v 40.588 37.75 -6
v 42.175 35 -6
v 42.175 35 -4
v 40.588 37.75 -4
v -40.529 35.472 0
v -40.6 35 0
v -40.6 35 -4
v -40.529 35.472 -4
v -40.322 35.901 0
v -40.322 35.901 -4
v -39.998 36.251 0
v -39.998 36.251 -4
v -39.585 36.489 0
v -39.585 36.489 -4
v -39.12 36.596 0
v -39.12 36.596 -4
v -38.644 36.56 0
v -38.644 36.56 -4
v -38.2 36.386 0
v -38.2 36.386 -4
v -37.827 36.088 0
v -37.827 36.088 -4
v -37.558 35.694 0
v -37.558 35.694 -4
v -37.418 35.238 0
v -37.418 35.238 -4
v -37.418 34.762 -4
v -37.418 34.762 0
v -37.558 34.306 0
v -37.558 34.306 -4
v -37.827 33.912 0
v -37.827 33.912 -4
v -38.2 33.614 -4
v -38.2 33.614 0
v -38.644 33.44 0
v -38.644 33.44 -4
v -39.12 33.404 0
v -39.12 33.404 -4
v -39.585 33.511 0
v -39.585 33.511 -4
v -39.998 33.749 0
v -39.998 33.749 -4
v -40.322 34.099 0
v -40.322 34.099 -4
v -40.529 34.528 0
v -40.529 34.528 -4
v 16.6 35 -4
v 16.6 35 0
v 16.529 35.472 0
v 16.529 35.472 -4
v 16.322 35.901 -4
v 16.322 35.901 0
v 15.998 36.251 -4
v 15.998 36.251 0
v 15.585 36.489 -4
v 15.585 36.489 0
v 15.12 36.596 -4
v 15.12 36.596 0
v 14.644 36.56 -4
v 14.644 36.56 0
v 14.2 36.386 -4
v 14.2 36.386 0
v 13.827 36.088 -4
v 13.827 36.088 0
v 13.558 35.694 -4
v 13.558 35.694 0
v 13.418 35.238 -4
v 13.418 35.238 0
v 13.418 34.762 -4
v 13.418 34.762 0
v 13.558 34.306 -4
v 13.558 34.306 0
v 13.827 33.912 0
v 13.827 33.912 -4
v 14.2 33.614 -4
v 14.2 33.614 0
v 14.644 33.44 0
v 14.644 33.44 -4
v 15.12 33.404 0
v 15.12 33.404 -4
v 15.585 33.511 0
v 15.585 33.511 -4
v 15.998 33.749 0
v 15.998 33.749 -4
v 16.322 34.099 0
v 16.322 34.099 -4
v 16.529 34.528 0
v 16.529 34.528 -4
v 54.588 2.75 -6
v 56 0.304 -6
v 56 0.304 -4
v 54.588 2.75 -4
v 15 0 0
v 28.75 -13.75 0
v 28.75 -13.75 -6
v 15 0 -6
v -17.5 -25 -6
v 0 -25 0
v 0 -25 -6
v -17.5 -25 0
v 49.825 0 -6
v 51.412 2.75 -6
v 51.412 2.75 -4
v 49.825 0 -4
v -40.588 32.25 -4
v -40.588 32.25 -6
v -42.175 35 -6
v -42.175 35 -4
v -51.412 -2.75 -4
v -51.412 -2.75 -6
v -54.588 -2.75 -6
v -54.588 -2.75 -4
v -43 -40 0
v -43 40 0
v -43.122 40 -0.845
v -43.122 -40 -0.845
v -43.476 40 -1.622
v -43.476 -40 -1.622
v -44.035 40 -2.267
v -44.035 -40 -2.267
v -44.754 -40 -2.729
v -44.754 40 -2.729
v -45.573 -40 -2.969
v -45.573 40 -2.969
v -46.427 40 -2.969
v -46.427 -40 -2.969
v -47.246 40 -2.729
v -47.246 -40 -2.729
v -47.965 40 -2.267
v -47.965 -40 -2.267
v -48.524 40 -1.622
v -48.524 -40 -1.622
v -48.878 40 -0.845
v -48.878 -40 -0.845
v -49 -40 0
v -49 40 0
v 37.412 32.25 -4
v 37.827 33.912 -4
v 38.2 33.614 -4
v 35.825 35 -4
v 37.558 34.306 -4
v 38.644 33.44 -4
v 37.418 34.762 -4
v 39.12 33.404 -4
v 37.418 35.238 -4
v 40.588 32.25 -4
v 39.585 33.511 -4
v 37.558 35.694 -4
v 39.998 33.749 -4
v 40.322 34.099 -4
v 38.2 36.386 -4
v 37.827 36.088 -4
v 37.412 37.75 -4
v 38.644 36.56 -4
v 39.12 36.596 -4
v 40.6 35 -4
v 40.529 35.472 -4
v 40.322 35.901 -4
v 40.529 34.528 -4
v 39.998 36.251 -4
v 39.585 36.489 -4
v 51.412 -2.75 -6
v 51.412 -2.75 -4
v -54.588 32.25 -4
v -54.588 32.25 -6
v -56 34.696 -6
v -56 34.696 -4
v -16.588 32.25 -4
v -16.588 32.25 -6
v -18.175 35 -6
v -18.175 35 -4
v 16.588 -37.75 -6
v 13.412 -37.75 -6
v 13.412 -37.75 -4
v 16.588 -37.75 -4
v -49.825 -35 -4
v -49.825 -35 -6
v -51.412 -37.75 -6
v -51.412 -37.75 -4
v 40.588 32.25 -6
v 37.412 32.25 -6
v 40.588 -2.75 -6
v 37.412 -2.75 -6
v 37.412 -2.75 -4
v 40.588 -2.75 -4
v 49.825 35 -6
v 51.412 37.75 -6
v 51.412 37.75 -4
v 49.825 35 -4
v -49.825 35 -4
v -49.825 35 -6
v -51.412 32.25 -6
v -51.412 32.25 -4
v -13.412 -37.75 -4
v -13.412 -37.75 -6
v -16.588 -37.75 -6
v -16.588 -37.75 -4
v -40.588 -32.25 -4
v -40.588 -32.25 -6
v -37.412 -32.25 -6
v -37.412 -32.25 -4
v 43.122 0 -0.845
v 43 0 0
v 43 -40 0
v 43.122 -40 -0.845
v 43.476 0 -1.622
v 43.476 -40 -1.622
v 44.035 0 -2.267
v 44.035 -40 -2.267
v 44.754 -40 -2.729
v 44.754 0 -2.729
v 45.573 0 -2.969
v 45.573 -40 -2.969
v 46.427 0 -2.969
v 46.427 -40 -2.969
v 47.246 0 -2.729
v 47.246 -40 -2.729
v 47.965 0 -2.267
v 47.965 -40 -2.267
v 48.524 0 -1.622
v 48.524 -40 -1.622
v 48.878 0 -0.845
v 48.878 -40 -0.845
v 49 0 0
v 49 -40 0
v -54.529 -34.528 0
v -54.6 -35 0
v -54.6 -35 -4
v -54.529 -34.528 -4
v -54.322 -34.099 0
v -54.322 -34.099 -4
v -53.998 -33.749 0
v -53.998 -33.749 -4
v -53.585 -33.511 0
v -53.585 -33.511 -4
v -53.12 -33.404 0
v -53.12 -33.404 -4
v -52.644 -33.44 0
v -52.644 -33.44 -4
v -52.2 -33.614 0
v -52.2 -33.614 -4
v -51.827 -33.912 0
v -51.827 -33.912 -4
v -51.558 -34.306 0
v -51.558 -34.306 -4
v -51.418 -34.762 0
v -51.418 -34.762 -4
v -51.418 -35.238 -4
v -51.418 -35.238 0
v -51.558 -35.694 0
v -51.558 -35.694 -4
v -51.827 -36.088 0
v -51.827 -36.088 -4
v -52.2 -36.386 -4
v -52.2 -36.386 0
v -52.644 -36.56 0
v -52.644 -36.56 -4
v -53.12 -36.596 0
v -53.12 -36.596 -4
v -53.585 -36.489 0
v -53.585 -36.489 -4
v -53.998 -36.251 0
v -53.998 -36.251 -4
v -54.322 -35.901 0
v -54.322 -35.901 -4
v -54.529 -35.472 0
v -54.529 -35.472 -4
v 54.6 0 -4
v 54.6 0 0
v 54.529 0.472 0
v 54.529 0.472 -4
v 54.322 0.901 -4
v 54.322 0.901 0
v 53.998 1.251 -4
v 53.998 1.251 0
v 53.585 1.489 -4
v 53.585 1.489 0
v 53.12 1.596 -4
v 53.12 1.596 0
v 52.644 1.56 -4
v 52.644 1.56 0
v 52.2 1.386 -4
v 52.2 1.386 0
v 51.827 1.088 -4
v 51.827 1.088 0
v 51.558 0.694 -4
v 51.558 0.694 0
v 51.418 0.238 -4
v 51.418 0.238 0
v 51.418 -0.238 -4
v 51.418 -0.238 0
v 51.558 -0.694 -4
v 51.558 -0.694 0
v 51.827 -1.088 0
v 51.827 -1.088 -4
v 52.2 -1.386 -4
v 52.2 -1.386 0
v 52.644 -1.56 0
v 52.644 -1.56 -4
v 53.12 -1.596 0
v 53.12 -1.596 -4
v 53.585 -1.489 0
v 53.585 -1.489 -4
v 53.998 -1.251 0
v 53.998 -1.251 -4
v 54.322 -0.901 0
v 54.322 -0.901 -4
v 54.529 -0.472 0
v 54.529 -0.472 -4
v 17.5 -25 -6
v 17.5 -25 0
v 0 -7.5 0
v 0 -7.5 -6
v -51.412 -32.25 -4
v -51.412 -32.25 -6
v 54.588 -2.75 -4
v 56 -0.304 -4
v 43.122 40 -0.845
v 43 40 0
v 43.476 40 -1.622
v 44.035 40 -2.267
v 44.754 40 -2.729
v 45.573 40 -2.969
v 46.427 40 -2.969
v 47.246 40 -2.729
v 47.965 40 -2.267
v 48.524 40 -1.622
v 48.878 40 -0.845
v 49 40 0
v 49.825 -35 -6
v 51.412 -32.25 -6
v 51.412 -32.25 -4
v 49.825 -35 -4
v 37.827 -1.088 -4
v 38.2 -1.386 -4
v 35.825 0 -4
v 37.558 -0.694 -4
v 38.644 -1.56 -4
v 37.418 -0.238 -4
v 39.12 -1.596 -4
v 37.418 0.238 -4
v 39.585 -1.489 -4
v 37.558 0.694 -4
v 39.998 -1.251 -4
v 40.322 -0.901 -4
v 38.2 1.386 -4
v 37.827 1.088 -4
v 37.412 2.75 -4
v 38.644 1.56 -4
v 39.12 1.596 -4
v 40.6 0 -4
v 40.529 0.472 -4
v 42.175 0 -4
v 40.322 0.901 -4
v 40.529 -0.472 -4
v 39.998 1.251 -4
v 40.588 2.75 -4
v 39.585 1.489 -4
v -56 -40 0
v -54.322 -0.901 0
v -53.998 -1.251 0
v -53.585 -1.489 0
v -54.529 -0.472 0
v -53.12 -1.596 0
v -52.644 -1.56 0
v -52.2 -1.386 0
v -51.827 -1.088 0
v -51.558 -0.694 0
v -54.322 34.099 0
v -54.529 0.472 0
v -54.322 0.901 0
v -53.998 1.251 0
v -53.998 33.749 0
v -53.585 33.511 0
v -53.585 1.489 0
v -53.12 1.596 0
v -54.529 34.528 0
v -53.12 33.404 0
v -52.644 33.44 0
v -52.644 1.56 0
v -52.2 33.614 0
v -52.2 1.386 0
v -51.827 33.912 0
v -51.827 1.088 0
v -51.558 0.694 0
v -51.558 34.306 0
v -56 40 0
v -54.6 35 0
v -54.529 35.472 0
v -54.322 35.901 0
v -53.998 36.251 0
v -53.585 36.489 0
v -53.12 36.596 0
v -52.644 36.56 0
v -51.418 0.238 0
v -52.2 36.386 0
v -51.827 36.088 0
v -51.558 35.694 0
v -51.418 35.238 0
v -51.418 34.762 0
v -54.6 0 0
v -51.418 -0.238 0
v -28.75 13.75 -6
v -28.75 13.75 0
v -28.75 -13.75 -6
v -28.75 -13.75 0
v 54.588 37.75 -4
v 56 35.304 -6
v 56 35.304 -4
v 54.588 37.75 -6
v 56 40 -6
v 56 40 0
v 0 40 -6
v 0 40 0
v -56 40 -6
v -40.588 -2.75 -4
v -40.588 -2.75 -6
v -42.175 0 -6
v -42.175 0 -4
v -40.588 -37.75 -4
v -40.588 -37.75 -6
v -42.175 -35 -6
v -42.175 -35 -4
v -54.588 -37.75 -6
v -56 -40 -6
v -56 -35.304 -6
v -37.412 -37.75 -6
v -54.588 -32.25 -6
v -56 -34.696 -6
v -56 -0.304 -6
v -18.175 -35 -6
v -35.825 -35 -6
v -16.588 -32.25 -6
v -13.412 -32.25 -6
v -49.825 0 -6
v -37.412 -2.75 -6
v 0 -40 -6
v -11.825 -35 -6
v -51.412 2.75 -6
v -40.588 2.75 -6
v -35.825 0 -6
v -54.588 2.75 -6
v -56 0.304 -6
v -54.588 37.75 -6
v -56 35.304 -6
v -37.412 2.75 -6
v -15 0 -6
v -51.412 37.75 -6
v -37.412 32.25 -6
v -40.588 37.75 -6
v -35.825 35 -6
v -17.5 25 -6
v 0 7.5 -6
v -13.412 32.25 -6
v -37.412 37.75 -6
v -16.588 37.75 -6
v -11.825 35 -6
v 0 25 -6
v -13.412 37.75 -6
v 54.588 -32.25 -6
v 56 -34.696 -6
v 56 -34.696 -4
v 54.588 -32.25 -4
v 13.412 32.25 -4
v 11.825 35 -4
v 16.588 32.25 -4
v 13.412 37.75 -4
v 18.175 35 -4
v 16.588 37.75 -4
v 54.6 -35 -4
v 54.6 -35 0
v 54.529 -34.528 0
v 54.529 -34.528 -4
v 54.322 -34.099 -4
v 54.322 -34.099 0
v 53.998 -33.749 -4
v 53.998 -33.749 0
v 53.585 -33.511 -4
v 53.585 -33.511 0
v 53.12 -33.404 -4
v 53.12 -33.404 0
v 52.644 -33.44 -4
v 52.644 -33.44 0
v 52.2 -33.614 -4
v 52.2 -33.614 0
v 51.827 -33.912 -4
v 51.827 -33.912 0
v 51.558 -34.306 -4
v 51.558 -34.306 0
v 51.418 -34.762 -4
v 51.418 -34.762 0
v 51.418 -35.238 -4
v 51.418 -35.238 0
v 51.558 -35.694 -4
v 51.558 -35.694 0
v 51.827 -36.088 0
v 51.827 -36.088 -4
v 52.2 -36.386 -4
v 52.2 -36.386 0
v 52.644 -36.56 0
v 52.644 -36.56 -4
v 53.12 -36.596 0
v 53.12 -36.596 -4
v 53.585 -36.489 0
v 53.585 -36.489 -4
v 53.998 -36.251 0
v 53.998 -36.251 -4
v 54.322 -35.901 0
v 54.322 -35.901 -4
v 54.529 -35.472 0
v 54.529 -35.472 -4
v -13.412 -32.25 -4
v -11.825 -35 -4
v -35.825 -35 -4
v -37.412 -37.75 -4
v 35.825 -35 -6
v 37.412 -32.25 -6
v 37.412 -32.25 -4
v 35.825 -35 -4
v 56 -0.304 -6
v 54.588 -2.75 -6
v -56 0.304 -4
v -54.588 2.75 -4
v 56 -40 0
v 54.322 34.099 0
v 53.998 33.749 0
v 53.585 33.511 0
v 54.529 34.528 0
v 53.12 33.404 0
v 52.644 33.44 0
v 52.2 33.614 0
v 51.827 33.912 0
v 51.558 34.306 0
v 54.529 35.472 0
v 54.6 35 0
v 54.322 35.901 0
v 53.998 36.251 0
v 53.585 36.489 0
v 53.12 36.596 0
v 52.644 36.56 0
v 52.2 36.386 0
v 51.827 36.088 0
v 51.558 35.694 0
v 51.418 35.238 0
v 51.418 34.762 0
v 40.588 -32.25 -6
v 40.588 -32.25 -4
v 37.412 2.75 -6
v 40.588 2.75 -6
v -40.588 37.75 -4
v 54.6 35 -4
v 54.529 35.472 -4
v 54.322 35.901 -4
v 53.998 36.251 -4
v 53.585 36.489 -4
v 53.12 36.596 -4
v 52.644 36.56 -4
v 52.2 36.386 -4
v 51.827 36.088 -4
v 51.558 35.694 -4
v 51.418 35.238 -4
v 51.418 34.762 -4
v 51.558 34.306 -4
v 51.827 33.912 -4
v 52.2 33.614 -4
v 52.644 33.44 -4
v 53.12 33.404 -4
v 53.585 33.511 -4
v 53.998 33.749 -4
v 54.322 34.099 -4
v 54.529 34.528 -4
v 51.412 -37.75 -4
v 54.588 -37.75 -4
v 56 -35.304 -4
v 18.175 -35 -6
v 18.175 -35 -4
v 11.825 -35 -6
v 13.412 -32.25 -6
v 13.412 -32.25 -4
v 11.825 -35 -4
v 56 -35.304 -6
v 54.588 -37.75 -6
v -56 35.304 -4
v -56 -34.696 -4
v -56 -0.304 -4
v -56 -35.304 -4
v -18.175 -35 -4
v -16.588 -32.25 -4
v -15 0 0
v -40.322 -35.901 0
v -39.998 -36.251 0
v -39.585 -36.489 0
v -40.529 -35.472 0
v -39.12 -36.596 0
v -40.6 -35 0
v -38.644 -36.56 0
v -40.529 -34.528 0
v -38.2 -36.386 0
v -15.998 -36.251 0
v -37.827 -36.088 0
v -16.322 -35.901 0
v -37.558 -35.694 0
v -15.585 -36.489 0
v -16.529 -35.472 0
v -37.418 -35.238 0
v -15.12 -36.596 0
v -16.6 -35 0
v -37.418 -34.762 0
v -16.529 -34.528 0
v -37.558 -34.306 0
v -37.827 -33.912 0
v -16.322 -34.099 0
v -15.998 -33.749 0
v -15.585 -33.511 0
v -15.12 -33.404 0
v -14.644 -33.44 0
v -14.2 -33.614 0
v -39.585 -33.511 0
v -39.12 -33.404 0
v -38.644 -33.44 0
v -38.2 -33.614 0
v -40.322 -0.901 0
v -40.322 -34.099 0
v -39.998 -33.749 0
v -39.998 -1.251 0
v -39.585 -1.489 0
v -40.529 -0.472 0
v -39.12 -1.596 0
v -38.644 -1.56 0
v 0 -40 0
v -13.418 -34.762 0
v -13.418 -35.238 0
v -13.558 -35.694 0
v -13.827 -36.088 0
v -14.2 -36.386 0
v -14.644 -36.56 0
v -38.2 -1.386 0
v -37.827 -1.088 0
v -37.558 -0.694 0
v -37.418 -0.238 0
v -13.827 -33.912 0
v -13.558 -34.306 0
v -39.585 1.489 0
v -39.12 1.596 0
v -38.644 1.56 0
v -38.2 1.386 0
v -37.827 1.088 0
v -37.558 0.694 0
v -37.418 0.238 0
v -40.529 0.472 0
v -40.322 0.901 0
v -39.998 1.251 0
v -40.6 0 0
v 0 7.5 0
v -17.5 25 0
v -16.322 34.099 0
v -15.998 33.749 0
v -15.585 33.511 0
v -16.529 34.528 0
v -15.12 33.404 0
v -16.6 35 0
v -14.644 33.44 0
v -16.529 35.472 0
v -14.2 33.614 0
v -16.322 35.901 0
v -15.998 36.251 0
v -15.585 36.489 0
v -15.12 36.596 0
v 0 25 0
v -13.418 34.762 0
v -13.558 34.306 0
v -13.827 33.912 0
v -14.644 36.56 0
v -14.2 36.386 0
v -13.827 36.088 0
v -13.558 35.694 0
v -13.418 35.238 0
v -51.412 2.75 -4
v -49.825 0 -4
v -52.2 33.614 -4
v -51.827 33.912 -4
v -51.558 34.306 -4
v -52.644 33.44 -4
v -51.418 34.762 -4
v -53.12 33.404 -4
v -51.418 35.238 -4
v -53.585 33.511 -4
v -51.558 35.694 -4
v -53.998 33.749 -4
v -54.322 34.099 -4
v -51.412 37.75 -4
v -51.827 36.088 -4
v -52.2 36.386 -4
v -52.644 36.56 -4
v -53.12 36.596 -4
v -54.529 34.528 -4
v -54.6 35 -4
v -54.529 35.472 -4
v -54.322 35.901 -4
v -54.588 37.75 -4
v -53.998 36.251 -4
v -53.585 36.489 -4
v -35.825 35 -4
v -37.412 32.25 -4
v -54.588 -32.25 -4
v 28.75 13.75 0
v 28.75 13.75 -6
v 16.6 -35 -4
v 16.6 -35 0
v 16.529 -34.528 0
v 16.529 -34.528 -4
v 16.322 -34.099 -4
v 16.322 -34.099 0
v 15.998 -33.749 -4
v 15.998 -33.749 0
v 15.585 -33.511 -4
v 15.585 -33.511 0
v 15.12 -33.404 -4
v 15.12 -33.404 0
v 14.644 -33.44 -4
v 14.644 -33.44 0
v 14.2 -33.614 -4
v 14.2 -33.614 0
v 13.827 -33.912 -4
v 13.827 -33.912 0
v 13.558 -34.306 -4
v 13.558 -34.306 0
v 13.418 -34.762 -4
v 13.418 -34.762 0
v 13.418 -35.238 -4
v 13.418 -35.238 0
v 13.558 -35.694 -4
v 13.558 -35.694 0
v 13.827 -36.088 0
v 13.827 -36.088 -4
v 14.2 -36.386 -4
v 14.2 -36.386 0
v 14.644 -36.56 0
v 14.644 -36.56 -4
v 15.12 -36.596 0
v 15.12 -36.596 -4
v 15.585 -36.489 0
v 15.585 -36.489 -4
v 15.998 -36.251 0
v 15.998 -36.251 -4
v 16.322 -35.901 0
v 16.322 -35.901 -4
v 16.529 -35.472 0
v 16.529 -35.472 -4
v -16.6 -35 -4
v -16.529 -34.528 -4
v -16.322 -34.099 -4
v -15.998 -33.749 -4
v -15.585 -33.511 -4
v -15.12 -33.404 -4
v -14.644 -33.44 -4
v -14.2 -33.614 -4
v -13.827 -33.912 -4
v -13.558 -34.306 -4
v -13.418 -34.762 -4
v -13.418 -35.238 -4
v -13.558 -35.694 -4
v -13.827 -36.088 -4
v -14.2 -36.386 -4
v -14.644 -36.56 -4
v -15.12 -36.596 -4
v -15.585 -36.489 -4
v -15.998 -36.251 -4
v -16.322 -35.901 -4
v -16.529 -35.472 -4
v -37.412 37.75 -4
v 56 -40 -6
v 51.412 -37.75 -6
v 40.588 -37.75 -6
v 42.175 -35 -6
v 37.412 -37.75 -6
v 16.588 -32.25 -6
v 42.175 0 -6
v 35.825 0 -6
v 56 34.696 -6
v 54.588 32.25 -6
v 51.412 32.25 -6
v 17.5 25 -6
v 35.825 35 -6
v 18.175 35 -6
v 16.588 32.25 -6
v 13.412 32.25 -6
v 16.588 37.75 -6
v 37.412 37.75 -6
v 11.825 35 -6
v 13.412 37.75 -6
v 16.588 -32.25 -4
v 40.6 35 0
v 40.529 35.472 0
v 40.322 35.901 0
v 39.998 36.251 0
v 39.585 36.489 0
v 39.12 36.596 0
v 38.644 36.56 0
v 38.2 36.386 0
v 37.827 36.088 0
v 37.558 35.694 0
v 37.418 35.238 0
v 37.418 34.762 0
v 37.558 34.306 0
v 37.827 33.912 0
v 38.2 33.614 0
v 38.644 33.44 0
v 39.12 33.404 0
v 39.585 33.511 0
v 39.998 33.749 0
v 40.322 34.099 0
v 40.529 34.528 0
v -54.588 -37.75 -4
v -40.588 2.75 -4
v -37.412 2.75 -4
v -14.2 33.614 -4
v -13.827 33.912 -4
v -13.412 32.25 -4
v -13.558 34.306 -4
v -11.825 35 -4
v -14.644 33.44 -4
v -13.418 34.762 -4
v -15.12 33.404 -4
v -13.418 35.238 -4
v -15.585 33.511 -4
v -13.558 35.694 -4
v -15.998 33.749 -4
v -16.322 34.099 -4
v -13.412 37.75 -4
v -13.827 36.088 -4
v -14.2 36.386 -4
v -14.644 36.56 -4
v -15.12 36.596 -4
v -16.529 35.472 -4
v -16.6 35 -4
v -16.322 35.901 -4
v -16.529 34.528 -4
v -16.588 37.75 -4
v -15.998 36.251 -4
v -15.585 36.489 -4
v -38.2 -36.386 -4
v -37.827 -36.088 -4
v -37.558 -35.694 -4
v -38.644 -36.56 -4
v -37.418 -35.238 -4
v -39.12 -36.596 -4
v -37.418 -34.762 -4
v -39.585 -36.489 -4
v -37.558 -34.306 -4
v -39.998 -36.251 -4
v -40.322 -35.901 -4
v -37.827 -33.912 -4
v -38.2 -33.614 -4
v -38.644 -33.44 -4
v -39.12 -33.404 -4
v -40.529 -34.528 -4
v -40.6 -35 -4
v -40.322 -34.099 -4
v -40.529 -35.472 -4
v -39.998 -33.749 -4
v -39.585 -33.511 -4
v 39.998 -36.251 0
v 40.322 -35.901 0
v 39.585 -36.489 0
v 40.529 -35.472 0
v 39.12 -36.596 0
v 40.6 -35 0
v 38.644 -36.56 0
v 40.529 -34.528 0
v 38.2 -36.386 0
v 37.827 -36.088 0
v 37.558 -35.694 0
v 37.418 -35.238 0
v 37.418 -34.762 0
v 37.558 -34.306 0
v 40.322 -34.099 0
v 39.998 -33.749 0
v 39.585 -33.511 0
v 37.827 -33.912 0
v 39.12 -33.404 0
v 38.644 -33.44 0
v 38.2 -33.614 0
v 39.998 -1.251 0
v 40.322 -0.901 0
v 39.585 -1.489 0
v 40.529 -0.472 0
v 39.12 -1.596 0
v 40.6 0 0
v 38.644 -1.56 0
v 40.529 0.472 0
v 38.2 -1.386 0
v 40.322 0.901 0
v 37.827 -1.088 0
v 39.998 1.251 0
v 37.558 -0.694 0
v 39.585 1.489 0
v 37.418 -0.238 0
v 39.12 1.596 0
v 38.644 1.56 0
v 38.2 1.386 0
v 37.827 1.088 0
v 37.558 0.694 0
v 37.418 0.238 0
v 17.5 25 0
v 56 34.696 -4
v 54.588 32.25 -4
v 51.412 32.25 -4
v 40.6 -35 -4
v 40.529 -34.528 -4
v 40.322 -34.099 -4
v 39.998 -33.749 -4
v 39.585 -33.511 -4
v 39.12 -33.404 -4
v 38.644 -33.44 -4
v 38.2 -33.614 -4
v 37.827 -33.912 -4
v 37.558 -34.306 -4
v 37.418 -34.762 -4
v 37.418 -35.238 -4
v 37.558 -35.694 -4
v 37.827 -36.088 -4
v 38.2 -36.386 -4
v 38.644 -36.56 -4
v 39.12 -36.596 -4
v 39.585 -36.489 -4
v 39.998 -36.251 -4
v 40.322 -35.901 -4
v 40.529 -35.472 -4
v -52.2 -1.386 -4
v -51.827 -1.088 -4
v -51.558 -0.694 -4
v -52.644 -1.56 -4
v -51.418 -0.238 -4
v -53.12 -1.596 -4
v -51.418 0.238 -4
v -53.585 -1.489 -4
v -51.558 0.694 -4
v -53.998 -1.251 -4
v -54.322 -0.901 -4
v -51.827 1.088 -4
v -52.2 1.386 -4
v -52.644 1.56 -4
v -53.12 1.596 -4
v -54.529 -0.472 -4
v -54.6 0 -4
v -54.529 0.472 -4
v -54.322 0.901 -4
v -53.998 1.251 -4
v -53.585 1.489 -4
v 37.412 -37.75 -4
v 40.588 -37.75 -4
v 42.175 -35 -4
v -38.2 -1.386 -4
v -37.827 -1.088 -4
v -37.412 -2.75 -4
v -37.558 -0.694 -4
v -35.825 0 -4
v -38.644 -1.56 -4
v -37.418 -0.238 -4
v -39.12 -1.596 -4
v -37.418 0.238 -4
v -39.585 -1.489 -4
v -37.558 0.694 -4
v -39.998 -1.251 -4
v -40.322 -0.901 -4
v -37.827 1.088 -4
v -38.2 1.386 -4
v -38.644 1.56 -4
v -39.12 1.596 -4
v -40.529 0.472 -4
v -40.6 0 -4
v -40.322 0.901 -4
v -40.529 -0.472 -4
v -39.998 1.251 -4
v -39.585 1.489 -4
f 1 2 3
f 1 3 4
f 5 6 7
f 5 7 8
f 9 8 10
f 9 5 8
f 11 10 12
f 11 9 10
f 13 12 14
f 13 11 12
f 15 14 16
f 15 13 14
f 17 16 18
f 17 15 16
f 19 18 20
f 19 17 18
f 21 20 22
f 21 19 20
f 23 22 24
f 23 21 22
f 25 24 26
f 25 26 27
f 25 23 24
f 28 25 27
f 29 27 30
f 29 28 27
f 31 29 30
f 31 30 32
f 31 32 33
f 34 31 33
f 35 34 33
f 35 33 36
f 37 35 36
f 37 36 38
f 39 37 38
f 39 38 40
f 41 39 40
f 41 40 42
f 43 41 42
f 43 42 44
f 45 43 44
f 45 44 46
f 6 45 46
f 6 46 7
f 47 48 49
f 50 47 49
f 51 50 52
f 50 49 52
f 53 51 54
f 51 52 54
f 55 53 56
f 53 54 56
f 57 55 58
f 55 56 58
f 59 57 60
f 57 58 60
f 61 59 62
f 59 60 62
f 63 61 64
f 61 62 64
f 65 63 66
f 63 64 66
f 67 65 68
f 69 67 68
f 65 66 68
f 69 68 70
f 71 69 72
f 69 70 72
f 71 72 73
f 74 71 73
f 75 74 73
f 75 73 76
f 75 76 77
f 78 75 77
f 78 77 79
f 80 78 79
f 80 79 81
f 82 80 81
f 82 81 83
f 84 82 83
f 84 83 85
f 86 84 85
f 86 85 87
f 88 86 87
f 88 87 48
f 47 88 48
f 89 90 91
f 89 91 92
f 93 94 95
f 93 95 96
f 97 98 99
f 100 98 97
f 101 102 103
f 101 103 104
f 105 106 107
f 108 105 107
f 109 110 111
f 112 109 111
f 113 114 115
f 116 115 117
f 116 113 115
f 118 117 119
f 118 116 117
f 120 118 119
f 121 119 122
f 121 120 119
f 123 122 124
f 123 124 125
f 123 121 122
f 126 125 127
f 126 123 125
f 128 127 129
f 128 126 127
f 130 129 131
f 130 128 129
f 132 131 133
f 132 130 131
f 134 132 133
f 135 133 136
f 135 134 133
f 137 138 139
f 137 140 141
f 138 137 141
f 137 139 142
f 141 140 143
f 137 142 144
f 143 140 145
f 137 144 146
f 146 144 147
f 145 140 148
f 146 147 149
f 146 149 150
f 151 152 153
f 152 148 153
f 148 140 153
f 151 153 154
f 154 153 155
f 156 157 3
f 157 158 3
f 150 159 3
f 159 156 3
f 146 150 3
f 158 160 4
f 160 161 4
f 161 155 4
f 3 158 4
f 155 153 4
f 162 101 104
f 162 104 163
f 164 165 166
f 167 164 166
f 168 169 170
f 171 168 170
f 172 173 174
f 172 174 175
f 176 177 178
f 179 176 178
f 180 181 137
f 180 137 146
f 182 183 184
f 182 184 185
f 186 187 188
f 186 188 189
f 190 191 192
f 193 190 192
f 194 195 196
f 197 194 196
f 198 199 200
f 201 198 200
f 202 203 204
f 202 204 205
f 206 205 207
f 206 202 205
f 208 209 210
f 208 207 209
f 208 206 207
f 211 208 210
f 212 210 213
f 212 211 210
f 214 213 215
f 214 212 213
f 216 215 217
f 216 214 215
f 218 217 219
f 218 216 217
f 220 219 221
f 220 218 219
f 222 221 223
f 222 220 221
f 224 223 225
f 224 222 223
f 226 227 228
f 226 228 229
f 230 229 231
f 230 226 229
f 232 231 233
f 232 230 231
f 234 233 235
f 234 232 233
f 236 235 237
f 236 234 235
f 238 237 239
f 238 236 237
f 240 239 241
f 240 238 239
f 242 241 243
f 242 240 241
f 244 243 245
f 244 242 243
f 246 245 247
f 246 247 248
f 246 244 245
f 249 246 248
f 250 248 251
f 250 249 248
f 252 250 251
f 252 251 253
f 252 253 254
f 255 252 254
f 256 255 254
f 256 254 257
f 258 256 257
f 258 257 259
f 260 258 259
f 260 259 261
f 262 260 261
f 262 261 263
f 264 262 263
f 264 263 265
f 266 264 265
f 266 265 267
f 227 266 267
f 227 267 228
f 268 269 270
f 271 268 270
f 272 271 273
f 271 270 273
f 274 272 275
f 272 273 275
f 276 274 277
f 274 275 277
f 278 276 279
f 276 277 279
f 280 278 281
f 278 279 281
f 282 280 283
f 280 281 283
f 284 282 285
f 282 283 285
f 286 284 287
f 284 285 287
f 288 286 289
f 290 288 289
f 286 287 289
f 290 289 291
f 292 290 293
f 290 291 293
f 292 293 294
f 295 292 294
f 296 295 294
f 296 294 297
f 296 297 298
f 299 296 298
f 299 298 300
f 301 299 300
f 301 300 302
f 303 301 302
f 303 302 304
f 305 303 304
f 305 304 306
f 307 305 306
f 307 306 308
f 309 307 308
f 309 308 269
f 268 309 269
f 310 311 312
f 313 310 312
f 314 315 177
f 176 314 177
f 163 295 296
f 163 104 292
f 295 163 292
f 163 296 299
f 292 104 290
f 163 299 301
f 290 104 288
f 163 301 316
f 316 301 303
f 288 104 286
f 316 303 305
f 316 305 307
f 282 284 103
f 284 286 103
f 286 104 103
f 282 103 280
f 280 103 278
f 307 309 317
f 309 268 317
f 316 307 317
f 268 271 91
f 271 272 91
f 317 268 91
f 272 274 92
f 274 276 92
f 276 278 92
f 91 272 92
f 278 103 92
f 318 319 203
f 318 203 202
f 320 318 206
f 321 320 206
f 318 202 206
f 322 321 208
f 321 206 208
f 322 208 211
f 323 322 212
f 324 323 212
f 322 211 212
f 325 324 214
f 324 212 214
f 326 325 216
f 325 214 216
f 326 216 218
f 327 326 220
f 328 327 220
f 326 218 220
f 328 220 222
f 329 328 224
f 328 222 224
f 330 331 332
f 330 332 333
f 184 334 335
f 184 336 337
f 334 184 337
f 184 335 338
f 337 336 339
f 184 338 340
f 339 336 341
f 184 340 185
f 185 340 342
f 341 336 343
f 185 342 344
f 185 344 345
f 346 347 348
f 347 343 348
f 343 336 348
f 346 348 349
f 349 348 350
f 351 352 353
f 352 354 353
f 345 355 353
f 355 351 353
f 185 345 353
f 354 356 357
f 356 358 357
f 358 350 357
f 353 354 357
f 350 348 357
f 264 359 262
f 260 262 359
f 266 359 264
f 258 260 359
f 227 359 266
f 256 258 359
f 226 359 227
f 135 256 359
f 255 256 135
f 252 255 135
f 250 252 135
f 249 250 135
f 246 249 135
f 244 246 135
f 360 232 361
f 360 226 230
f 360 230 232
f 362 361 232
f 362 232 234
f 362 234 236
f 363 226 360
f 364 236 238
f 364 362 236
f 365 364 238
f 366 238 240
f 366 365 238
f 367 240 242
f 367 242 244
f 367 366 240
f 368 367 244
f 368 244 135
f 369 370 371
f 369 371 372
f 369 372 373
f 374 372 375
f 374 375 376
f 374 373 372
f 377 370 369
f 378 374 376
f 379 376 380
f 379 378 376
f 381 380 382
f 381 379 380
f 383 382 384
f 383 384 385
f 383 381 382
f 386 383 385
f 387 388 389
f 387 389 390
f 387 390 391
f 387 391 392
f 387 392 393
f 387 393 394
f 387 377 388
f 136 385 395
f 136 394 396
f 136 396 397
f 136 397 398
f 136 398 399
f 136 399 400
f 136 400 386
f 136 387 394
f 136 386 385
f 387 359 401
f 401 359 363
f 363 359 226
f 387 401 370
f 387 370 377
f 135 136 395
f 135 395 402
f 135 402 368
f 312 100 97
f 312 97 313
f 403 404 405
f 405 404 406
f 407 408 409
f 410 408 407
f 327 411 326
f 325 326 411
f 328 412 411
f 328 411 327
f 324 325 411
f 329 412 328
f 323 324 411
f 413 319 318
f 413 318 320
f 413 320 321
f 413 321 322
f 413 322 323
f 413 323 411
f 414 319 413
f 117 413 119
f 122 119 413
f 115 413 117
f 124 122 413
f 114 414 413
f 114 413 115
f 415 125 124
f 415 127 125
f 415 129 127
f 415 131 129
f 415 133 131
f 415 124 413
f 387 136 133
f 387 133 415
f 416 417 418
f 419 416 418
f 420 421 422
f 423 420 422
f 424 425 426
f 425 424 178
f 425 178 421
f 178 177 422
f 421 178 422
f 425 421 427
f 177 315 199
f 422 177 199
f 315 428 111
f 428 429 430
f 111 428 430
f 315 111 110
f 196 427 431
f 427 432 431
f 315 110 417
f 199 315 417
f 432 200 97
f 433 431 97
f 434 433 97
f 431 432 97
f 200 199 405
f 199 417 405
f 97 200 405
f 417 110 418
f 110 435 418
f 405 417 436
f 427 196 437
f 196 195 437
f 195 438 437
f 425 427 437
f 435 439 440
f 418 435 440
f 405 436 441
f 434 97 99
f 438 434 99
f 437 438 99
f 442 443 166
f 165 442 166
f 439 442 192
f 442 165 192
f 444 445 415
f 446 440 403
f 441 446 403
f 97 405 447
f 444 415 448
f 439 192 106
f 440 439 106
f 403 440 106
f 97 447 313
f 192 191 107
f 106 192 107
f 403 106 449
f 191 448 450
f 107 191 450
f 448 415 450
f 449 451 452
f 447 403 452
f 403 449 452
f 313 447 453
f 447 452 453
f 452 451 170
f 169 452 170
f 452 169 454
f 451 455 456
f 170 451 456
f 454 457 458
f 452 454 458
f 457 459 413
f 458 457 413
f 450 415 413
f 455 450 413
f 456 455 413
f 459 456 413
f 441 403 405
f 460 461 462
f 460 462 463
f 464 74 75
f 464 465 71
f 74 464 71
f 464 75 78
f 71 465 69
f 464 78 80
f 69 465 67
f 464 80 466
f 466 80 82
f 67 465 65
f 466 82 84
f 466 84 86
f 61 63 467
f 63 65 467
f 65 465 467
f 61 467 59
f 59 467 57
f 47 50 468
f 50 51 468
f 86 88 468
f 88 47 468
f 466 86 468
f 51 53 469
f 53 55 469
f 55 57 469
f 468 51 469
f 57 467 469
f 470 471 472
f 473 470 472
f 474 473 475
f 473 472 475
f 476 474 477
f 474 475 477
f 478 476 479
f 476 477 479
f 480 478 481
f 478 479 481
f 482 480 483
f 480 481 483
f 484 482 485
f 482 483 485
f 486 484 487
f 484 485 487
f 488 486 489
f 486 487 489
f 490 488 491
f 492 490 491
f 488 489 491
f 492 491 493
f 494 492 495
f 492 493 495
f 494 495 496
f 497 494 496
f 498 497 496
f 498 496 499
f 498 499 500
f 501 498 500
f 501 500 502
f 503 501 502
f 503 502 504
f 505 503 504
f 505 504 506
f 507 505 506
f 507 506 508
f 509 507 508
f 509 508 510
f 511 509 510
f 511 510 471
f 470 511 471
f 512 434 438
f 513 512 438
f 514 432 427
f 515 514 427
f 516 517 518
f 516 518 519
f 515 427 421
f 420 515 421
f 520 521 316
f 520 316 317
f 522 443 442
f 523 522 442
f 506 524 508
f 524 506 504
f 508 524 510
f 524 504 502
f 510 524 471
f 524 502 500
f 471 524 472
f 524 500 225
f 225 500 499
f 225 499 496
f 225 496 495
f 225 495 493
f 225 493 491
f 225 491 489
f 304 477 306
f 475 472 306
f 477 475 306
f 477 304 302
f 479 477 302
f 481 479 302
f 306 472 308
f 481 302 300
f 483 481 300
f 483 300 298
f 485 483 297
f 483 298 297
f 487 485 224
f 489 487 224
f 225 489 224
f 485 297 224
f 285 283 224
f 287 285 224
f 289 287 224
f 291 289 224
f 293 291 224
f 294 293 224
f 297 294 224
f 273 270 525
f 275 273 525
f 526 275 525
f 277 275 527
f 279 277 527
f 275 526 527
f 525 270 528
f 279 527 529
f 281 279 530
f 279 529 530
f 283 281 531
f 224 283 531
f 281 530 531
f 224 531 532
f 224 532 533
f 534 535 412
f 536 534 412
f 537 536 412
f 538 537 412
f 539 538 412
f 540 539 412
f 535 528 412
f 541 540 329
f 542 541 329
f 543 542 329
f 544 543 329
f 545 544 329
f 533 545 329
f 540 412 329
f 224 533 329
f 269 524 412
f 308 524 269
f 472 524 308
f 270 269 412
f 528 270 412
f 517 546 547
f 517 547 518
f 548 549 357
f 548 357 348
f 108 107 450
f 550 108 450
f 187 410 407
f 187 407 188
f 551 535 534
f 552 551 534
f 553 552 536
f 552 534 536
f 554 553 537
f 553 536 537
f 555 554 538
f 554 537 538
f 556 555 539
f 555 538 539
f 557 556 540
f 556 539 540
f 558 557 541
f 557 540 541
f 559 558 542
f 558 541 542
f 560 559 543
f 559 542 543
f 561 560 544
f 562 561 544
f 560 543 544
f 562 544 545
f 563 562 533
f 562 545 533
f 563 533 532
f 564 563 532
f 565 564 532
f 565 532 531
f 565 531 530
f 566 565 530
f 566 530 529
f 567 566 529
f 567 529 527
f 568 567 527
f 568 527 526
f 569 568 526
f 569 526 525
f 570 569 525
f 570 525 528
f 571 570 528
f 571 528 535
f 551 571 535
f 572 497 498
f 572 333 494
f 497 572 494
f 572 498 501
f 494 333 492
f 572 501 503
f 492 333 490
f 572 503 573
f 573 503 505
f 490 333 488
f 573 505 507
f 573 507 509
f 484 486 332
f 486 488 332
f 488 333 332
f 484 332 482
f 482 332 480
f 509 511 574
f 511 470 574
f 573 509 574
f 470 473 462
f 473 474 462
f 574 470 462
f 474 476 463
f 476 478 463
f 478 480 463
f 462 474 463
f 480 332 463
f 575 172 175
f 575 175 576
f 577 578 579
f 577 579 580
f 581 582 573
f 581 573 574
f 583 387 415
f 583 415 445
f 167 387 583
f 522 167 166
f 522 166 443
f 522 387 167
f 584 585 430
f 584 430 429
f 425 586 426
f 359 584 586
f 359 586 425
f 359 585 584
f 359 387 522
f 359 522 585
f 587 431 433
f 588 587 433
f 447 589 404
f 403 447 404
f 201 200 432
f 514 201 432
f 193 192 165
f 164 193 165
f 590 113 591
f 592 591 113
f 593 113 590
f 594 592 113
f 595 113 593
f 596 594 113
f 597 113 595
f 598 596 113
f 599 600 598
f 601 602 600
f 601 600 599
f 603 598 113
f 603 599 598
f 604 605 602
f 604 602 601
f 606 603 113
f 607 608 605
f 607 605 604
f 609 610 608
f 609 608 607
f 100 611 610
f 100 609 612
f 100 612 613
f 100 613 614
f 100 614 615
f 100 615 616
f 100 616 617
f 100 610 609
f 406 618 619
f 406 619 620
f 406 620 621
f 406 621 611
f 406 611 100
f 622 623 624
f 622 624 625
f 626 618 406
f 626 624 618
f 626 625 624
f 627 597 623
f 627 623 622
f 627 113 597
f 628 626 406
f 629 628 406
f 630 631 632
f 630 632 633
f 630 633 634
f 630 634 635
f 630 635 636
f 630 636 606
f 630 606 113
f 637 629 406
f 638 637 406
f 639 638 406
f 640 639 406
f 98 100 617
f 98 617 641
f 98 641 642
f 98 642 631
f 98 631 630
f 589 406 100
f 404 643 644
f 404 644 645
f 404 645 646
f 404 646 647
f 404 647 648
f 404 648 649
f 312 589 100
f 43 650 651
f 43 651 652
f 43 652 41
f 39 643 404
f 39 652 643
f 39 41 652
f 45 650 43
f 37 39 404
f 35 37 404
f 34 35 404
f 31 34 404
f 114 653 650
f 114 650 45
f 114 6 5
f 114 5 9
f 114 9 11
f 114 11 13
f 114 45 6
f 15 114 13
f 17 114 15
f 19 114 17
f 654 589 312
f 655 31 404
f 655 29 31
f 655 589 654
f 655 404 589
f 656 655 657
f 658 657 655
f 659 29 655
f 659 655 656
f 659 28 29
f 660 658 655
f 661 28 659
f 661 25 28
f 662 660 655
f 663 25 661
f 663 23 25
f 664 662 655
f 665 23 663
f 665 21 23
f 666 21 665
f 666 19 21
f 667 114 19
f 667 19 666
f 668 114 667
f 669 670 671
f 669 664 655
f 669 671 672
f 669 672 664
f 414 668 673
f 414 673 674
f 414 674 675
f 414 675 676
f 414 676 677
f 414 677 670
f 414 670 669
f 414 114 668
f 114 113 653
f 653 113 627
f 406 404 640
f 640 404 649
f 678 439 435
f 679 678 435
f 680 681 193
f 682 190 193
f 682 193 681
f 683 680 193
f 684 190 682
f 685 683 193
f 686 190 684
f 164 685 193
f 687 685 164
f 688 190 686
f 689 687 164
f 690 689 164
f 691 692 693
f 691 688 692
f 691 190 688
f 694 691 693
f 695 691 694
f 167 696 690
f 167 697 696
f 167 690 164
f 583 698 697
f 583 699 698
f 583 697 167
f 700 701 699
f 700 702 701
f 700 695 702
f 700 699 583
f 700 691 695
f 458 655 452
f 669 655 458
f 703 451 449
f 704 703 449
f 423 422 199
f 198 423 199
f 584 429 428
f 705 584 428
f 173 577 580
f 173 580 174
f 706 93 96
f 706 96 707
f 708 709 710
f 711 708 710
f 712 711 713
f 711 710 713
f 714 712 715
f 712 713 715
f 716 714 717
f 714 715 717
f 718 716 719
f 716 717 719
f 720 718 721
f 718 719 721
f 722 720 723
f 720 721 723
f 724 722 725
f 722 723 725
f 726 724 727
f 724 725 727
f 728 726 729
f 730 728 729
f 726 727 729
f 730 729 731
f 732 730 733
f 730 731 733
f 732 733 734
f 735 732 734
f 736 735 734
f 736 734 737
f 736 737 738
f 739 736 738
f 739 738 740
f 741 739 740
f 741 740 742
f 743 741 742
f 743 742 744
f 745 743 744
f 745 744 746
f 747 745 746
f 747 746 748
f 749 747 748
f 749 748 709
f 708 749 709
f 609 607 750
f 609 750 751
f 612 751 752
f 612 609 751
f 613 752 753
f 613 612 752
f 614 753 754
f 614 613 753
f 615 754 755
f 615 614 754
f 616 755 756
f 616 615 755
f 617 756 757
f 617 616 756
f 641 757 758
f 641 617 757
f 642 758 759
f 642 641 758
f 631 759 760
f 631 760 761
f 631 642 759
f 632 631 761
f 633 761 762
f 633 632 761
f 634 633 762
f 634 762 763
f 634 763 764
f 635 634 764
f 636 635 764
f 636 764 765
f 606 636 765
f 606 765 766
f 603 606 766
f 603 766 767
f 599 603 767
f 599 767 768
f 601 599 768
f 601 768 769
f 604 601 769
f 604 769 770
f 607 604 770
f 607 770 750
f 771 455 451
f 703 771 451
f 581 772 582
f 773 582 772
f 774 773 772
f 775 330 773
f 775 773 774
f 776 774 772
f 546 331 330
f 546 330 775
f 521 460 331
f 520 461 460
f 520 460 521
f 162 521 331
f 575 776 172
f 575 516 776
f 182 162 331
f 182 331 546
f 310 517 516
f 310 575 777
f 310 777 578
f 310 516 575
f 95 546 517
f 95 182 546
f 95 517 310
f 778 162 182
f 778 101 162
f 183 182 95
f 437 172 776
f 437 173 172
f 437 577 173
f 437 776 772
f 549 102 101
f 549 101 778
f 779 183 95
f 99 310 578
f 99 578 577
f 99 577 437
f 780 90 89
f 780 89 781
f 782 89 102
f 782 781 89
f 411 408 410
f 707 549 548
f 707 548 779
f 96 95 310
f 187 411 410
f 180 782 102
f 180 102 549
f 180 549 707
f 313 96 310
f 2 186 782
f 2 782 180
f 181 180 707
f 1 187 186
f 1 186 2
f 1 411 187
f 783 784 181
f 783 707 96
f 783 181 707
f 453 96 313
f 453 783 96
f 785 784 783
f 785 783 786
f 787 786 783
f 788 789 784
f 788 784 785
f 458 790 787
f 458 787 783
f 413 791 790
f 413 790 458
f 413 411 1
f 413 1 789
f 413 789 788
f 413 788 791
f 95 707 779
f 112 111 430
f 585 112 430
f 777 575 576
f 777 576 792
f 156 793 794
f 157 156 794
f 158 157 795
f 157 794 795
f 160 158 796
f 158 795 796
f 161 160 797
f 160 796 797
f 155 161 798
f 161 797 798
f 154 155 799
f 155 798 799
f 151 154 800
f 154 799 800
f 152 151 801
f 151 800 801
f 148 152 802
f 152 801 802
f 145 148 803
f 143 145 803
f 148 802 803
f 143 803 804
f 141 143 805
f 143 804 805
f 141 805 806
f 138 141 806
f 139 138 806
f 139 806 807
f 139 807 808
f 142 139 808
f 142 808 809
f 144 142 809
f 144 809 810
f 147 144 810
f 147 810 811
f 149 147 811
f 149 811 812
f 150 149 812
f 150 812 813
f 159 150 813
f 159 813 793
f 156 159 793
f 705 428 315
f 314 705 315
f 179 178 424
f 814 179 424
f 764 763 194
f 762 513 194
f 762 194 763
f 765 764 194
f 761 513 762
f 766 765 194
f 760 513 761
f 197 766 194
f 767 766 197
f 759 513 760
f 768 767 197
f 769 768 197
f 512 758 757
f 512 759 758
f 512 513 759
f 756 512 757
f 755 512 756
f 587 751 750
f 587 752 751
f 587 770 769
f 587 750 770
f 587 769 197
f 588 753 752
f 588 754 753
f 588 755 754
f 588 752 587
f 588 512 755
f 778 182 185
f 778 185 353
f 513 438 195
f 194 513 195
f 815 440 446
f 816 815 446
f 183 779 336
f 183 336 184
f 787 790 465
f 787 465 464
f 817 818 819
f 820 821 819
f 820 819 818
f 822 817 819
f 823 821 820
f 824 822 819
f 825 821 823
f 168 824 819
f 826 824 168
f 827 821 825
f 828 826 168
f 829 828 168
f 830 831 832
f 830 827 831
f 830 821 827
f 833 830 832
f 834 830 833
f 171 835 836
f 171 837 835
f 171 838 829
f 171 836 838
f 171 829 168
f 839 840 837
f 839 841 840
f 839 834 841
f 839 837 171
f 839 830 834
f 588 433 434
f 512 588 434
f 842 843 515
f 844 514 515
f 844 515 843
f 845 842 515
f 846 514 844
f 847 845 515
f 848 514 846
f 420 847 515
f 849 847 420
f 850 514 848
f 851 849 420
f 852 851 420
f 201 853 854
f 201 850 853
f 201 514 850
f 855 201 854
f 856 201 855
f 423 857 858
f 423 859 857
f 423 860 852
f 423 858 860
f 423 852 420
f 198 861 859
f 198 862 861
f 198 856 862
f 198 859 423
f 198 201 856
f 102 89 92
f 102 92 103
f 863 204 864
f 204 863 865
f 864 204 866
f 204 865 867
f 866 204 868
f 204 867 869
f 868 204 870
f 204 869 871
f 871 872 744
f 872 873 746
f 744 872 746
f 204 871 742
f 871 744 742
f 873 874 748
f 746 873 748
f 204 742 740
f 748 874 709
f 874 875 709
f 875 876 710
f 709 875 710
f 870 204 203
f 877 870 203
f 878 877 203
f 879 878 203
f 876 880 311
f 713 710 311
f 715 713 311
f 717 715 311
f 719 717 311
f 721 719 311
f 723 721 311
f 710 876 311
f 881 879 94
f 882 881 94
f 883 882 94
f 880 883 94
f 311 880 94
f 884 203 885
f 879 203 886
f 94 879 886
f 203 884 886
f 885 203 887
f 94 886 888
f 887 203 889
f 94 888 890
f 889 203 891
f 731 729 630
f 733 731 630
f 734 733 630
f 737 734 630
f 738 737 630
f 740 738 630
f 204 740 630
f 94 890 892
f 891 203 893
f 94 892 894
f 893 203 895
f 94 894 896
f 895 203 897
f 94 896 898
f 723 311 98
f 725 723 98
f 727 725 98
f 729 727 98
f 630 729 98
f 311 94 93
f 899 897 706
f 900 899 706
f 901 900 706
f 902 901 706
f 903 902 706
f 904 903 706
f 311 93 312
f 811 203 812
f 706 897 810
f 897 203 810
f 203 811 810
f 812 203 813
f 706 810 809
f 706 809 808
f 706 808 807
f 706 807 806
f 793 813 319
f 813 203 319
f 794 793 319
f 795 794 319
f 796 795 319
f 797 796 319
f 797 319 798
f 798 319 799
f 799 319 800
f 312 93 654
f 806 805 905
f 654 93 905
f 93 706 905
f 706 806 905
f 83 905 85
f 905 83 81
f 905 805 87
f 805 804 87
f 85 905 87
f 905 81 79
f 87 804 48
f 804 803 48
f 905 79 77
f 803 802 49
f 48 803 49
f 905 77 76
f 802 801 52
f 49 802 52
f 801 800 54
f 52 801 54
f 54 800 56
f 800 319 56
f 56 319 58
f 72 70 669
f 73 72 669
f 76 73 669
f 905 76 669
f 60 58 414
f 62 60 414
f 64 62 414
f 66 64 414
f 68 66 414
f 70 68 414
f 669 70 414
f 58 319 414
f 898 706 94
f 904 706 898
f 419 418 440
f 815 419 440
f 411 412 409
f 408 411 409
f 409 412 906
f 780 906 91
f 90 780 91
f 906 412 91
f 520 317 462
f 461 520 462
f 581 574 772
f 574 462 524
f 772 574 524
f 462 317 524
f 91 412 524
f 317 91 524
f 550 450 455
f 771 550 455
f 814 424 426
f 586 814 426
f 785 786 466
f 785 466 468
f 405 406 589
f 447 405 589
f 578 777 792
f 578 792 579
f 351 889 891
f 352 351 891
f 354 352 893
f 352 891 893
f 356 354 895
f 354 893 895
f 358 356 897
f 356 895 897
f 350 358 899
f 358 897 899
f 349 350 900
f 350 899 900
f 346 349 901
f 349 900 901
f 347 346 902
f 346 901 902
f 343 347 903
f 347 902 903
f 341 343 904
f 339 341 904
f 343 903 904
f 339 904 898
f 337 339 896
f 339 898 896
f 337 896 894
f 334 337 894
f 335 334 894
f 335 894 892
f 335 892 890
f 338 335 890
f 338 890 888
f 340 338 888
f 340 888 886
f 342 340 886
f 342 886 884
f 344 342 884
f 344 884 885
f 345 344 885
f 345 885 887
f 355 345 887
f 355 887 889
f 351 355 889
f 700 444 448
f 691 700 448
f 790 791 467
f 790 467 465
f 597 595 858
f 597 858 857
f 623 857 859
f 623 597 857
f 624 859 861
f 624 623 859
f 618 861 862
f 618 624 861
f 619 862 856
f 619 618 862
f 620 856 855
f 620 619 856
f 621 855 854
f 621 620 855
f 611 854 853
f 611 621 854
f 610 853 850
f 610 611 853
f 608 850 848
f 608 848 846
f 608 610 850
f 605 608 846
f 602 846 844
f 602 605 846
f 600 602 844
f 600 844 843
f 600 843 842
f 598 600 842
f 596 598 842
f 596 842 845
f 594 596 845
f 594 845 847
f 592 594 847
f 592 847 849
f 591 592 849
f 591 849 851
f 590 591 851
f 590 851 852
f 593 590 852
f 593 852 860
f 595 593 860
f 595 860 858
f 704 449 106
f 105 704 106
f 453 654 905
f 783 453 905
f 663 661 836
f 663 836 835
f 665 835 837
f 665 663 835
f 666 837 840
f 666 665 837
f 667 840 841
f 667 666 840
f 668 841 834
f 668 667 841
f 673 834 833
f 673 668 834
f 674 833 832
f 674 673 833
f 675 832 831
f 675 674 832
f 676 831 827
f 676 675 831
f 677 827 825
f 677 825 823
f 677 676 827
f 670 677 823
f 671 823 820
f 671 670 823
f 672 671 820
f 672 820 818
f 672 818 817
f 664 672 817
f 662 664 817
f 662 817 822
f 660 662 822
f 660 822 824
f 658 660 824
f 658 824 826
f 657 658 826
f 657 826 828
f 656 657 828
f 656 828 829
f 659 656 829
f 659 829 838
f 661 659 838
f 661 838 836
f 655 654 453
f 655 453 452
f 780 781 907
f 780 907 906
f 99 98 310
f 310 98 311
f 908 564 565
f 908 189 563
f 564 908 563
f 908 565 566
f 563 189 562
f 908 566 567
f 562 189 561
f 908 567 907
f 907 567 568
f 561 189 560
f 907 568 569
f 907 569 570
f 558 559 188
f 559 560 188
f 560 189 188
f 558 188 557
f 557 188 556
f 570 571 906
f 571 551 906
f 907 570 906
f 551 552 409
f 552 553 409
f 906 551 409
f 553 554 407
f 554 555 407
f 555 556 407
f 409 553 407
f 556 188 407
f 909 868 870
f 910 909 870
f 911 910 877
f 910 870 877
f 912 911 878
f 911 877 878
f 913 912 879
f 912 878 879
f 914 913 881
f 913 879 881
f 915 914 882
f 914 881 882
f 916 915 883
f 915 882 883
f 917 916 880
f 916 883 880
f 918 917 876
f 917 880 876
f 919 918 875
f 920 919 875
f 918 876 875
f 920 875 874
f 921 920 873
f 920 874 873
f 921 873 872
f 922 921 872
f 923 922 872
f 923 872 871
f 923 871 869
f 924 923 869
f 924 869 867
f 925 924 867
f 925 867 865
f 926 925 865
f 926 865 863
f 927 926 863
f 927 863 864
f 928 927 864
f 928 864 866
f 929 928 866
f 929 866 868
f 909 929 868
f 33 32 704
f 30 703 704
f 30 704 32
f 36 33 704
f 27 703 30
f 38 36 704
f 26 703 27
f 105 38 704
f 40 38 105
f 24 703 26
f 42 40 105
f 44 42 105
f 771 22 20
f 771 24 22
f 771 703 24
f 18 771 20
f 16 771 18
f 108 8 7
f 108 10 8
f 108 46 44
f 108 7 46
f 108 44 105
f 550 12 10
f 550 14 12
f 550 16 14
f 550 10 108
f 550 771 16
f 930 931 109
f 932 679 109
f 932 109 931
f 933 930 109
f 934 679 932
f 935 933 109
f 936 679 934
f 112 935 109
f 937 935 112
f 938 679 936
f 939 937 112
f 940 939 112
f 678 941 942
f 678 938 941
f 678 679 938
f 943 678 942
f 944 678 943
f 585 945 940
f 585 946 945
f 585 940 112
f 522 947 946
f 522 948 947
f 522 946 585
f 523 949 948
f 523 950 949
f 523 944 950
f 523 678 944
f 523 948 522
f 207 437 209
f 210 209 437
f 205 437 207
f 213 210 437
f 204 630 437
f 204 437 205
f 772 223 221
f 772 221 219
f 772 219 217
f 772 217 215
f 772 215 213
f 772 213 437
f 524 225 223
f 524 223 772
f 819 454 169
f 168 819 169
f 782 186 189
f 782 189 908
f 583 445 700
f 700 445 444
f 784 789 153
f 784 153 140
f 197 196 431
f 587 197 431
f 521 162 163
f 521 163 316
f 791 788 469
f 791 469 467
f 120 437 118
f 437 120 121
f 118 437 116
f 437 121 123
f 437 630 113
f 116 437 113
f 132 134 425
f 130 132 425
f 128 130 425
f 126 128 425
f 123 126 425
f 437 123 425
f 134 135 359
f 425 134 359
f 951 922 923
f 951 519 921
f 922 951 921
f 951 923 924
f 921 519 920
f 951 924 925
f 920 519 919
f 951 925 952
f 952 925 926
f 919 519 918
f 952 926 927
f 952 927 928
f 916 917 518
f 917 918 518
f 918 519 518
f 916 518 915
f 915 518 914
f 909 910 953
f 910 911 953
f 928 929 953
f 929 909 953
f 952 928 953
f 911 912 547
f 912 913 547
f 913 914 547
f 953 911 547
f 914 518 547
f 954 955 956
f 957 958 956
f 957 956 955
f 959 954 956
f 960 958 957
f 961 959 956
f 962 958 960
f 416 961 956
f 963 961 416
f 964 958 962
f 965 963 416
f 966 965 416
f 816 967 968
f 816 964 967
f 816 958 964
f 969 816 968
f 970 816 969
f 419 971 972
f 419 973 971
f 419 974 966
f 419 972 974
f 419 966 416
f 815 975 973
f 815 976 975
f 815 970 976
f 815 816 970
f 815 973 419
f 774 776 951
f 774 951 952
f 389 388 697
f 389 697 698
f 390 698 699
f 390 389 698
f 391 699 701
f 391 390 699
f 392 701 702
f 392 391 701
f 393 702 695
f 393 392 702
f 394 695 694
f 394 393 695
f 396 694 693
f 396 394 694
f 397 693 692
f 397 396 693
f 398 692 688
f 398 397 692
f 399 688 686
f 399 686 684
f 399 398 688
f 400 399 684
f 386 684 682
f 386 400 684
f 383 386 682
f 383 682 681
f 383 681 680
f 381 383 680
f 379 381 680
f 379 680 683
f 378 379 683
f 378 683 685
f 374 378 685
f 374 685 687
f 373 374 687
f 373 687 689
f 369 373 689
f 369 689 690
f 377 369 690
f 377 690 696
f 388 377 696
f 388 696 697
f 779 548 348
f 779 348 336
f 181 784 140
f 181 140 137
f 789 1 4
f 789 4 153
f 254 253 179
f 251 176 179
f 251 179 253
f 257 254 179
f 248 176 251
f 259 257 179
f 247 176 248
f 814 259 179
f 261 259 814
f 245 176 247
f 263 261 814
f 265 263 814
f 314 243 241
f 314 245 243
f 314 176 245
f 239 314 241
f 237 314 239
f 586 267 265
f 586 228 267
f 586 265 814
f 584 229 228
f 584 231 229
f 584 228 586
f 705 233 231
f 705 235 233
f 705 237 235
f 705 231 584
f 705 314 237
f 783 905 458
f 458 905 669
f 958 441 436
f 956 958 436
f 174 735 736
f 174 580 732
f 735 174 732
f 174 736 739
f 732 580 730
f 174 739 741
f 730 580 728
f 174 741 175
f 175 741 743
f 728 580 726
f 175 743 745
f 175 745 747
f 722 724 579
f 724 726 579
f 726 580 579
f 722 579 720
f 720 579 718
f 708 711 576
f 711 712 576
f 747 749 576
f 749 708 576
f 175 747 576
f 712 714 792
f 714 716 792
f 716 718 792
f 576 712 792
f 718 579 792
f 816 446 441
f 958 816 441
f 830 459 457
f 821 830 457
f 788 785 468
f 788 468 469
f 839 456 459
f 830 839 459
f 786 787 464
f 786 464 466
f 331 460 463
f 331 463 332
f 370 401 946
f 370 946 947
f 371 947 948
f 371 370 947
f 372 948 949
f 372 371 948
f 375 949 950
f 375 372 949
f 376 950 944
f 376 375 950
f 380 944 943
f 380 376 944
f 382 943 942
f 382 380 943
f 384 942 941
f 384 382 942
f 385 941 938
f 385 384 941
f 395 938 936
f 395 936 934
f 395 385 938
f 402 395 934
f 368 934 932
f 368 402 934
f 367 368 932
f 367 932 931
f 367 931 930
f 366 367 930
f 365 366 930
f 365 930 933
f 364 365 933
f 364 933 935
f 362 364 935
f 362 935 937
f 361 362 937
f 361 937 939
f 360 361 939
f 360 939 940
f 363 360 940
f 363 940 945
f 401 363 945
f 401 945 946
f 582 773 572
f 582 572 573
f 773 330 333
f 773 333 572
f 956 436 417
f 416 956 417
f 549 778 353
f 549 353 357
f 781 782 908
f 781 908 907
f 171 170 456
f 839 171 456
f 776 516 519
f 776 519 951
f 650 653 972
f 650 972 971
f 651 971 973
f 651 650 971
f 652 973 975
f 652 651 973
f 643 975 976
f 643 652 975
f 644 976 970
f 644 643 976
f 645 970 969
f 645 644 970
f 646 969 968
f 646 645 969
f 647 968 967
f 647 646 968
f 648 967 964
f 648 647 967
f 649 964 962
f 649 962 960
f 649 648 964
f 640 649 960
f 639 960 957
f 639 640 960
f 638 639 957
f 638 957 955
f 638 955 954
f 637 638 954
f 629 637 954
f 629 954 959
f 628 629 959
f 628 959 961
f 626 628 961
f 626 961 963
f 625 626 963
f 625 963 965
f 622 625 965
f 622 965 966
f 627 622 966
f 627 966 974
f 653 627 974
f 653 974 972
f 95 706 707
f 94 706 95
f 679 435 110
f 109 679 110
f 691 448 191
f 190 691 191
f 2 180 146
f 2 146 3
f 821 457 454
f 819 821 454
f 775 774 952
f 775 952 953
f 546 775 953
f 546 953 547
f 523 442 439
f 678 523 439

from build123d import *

# Parameters (mm, degrees)
SKETCH_R          = 1.6
PAD_DEPTH         = 6
SKETCH001_R       = 3
POCKET_DEPTH      = 40.001
POCKET_DEPTH_BACK = -40.001
POCKET001_DEPTH   = 2


with BuildPart() as toolbody:
    # Sketch → Pad (new body)
    with BuildSketch(Plane.XY):
        Polygon((0, 40), (46, 40), (56, 40), (56, -40), (46, -40), (0, -40), (0, -25), (17.5, -25), (0, -7.5), (0, 7.5), (17.5, 25), (0, 25), align=None)
        with Locations((53, 0)):
            Circle(SKETCH_R, mode=Mode.SUBTRACT)
        with Locations((53, 35)):
            Circle(SKETCH_R, mode=Mode.SUBTRACT)
        with Locations((53, -35)):
            Circle(SKETCH_R, mode=Mode.SUBTRACT)
        with Locations((39, 35)):
            Circle(SKETCH_R, mode=Mode.SUBTRACT)
        with Locations((39, 0)):
            Circle(SKETCH_R, mode=Mode.SUBTRACT)
        with Locations((39, -35)):
            Circle(SKETCH_R, mode=Mode.SUBTRACT)
        with Locations((15, 35)):
            Circle(SKETCH_R, mode=Mode.SUBTRACT)
        with Locations((15, -35)):
            Circle(SKETCH_R, mode=Mode.SUBTRACT)
        Polygon((15, 0), (28.75, 13.75), (28.75, -13.75), align=None, mode=Mode.SUBTRACT)
    extrude(amount=-PAD_DEPTH)

    # Sketch001 → Pocket (cut, two sides)
    with BuildSketch(Plane.XZ) as pocket_sk:
        with Locations((46, 0)):
            Circle(SKETCH001_R)
    extrude(amount=-POCKET_DEPTH, mode=Mode.SUBTRACT)
    extrude(pocket_sk.sketch, amount=-POCKET_DEPTH_BACK, mode=Mode.SUBTRACT)

    # Sketch002 (on DatumPlane) → Pocket001 (cut)
    with BuildSketch(Plane.XY.offset(-6)):
        Polygon((16.587713, 32.25), (18.175426, 35), (16.587713, 37.75), (13.412287, 37.75), (11.824574, 35), (13.412287, 32.25), align=None)
        Polygon((40.587713, 32.25), (42.175426, 35), (40.587713, 37.75), (37.412287, 37.75), (35.824574, 35), (37.412287, 32.25), align=None)
        Polygon((54.587713, 32.25), (56.175426, 35), (54.587713, 37.75), (51.412287, 37.75), (49.824574, 35), (51.412287, 32.25), align=None)
        Polygon((54.587713, -2.75), (56.175426, 0), (54.587713, 2.75), (51.412287, 2.75), (49.824574, 0), (51.412287, -2.75), align=None)
        Polygon((40.587713, -2.75), (42.175426, 0), (40.587713, 2.75), (37.412287, 2.75), (35.824574, 0), (37.412287, -2.75), align=None)
        Polygon((54.587713, -37.75), (56.175426, -35), (54.587713, -32.25), (51.412287, -32.25), (49.824574, -35), (51.412287, -37.75), align=None)
        Polygon((40.587713, -37.75), (42.175426, -35), (40.587713, -32.25), (37.412287, -32.25), (35.824574, -35), (37.412287, -37.75), align=None)
        Polygon((16.587713, -37.75), (18.175426, -35), (16.587713, -32.25), (13.412287, -32.25), (11.824574, -35), (13.412287, -37.75), align=None)
    extrude(amount=POCKET001_DEPTH, mode=Mode.SUBTRACT)


with BuildPart() as toolfusion:
    # Part__Mirroring: instance of ToolBody
    add(toolbody.part.mirror(Plane(origin=(0, 0, 0), x_dir=(0, -1, 0), z_dir=(1, 0, 0))))

    # Fusion: union ToolBody
    add(toolbody.part)


solid = toolfusion.part
